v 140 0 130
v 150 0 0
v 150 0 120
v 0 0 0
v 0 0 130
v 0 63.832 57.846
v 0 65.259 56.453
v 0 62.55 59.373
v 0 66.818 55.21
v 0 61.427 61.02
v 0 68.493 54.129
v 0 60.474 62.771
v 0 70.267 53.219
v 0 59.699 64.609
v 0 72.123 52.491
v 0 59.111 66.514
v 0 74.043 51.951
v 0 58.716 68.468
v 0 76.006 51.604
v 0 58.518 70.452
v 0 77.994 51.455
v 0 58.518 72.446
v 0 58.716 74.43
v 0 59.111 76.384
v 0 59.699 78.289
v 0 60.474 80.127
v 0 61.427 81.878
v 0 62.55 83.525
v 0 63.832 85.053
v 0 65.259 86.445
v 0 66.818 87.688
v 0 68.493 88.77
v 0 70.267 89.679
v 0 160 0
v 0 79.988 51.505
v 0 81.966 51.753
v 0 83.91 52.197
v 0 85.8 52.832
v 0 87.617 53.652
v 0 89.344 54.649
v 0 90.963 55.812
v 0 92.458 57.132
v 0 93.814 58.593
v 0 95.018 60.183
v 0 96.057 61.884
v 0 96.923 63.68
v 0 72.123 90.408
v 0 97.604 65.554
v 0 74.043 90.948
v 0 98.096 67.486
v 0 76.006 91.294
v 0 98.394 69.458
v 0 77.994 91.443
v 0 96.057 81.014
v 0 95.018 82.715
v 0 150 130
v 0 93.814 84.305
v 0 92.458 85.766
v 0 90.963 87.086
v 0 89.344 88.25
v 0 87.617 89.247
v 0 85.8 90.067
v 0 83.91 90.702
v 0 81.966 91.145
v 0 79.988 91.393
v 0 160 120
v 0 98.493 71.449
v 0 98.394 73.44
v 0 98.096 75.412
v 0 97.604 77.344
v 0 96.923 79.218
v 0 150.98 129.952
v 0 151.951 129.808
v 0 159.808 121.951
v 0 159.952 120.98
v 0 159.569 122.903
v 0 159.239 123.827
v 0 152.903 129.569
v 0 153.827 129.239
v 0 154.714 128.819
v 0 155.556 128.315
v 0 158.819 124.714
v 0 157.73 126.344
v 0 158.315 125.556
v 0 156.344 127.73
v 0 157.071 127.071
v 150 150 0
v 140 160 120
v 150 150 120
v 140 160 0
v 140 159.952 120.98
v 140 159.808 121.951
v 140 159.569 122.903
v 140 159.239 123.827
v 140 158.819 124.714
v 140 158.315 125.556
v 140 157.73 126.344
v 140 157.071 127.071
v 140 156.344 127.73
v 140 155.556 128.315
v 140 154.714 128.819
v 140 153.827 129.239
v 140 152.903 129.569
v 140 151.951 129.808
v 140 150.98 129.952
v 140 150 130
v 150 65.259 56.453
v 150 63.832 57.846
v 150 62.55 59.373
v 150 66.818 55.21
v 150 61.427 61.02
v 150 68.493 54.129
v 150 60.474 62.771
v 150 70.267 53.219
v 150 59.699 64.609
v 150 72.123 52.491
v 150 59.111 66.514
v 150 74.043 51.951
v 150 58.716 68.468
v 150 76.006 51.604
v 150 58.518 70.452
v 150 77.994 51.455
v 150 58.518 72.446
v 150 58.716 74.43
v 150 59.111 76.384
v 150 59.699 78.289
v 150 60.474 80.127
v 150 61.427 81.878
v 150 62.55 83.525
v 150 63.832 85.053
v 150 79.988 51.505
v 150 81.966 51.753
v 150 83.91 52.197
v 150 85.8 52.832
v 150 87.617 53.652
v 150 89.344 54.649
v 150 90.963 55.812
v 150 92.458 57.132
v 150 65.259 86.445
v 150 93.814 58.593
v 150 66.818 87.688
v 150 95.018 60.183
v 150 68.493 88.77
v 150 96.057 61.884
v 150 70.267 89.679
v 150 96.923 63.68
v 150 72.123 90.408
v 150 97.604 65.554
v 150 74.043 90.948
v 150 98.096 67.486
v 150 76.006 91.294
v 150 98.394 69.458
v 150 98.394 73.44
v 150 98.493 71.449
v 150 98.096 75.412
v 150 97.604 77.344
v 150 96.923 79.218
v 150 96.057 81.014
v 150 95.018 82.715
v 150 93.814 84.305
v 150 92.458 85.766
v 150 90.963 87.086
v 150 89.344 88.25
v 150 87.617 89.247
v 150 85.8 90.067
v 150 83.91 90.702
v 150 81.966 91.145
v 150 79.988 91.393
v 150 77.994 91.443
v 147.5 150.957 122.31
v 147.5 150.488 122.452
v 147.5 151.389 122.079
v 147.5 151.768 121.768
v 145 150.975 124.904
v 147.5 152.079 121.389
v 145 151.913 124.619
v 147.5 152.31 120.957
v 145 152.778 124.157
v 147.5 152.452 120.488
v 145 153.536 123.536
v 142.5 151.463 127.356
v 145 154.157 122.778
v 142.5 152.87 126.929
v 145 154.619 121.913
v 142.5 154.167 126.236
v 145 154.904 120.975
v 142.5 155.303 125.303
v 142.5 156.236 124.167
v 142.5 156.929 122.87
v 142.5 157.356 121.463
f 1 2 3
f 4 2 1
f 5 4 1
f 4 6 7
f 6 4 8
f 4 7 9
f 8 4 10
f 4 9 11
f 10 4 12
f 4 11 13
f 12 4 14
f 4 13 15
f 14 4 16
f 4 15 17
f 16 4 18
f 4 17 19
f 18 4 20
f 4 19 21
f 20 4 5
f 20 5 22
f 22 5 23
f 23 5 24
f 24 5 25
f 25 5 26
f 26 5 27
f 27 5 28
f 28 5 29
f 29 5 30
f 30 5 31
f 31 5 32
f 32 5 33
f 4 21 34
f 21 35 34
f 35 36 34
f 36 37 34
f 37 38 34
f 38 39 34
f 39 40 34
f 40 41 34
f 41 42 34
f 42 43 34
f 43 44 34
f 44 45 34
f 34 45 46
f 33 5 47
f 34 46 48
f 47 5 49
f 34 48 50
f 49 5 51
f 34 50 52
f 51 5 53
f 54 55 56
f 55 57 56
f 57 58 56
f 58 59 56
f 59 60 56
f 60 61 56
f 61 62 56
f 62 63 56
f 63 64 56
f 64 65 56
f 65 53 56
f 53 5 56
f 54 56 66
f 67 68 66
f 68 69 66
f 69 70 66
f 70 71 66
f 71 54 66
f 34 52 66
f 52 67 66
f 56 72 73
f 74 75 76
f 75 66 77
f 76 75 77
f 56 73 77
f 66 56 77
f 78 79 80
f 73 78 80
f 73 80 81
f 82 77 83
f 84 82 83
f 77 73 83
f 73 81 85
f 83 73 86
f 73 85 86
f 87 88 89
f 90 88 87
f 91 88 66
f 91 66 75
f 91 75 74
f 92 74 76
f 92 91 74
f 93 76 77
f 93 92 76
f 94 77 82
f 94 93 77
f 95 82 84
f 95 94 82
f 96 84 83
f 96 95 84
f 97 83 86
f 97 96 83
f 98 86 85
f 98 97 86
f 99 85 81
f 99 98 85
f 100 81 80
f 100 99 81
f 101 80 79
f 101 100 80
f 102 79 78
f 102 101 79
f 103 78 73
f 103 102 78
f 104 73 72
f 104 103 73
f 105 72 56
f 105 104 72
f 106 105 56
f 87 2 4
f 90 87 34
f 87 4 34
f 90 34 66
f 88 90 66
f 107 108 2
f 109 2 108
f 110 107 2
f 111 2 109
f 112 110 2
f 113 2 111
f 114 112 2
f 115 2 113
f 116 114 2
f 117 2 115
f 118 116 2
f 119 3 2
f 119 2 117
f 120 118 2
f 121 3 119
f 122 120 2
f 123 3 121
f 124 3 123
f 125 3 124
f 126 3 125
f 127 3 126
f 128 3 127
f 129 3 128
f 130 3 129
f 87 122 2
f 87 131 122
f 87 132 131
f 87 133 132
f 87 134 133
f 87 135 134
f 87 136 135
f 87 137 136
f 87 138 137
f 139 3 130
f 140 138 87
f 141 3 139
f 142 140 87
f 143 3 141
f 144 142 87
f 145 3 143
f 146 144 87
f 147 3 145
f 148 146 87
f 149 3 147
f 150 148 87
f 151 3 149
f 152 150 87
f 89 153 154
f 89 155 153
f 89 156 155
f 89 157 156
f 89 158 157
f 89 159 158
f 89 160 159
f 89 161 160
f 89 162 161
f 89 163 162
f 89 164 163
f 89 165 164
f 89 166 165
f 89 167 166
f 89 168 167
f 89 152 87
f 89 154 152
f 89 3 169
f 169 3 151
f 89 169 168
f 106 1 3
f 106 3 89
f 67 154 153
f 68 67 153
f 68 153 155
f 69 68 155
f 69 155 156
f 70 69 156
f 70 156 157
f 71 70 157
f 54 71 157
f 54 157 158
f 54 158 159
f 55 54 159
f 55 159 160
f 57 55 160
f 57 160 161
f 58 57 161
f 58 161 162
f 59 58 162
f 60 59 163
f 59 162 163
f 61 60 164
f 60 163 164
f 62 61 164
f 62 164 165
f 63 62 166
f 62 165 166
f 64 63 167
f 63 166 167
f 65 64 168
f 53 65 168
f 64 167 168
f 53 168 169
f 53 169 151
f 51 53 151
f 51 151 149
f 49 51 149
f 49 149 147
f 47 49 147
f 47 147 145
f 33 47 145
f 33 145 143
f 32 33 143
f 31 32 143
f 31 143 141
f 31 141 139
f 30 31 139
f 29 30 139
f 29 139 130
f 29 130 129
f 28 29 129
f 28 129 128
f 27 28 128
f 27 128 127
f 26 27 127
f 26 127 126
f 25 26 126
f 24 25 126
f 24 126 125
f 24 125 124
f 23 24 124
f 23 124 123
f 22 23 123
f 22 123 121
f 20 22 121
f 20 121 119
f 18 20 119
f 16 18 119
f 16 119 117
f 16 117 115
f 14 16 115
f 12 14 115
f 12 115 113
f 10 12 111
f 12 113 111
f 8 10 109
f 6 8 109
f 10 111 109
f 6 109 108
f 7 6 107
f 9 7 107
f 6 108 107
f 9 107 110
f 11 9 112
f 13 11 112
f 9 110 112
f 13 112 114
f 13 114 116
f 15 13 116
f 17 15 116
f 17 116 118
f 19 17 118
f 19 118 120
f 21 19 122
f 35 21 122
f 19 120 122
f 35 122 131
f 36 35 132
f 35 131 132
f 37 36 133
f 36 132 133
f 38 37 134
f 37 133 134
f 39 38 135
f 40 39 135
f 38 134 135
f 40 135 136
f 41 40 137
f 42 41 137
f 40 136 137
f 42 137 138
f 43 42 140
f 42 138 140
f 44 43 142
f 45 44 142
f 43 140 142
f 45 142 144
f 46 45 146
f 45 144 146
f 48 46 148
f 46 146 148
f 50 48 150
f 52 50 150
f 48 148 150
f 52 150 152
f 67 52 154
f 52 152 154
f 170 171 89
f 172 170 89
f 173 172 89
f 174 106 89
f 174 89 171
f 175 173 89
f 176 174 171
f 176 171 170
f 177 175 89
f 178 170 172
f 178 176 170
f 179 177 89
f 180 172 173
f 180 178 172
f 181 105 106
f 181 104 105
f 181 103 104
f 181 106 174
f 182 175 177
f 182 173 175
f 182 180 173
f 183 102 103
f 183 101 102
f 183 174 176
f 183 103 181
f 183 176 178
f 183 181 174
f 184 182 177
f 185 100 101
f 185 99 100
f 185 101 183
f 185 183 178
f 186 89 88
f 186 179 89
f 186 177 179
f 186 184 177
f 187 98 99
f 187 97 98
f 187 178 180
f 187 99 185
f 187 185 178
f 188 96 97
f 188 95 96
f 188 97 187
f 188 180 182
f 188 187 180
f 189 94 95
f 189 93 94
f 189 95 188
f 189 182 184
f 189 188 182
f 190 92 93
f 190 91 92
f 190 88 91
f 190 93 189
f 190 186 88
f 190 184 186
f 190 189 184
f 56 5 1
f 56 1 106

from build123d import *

# Parameters (mm, degrees)
F0_W     = 160
F0_H     = 130
F1_DEPTH = 150
F2_R     = 10
F3_SIZE  = 10
F4_R     = 20
F5_DEPTH = 265


with BuildPart() as f1:
    # F0 (on Right) → F1 (new body)
    with BuildSketch(Plane.YZ):
        with Locations((80, 65)):
            Rectangle(F0_W, F0_H)
    extrude(amount=F1_DEPTH)

    # F2
    f2_edges = [f1.edges().sort_by_distance(p)[0] for p in [
        (75, 160, 130),
    ]]
    fillet(f2_edges, radius=F2_R)

    # F3
    f3_edges = [f1.edges().sort_by_distance(p)[0] for p in [
        (150, 75, 130),
        (150, 160, 60),
        (150, 157.071068, 127.071068),
    ]]
    chamfer(f3_edges, length=F3_SIZE)

    # F4 (on face) → F5 (cut)
    with BuildSketch(Plane.YZ.offset(150)):
        with Locations((78.493013978, 71.4490786195)):
            Circle(F4_R)
    extrude(amount=-F5_DEPTH, mode=Mode.SUBTRACT)


solid = f1.part
